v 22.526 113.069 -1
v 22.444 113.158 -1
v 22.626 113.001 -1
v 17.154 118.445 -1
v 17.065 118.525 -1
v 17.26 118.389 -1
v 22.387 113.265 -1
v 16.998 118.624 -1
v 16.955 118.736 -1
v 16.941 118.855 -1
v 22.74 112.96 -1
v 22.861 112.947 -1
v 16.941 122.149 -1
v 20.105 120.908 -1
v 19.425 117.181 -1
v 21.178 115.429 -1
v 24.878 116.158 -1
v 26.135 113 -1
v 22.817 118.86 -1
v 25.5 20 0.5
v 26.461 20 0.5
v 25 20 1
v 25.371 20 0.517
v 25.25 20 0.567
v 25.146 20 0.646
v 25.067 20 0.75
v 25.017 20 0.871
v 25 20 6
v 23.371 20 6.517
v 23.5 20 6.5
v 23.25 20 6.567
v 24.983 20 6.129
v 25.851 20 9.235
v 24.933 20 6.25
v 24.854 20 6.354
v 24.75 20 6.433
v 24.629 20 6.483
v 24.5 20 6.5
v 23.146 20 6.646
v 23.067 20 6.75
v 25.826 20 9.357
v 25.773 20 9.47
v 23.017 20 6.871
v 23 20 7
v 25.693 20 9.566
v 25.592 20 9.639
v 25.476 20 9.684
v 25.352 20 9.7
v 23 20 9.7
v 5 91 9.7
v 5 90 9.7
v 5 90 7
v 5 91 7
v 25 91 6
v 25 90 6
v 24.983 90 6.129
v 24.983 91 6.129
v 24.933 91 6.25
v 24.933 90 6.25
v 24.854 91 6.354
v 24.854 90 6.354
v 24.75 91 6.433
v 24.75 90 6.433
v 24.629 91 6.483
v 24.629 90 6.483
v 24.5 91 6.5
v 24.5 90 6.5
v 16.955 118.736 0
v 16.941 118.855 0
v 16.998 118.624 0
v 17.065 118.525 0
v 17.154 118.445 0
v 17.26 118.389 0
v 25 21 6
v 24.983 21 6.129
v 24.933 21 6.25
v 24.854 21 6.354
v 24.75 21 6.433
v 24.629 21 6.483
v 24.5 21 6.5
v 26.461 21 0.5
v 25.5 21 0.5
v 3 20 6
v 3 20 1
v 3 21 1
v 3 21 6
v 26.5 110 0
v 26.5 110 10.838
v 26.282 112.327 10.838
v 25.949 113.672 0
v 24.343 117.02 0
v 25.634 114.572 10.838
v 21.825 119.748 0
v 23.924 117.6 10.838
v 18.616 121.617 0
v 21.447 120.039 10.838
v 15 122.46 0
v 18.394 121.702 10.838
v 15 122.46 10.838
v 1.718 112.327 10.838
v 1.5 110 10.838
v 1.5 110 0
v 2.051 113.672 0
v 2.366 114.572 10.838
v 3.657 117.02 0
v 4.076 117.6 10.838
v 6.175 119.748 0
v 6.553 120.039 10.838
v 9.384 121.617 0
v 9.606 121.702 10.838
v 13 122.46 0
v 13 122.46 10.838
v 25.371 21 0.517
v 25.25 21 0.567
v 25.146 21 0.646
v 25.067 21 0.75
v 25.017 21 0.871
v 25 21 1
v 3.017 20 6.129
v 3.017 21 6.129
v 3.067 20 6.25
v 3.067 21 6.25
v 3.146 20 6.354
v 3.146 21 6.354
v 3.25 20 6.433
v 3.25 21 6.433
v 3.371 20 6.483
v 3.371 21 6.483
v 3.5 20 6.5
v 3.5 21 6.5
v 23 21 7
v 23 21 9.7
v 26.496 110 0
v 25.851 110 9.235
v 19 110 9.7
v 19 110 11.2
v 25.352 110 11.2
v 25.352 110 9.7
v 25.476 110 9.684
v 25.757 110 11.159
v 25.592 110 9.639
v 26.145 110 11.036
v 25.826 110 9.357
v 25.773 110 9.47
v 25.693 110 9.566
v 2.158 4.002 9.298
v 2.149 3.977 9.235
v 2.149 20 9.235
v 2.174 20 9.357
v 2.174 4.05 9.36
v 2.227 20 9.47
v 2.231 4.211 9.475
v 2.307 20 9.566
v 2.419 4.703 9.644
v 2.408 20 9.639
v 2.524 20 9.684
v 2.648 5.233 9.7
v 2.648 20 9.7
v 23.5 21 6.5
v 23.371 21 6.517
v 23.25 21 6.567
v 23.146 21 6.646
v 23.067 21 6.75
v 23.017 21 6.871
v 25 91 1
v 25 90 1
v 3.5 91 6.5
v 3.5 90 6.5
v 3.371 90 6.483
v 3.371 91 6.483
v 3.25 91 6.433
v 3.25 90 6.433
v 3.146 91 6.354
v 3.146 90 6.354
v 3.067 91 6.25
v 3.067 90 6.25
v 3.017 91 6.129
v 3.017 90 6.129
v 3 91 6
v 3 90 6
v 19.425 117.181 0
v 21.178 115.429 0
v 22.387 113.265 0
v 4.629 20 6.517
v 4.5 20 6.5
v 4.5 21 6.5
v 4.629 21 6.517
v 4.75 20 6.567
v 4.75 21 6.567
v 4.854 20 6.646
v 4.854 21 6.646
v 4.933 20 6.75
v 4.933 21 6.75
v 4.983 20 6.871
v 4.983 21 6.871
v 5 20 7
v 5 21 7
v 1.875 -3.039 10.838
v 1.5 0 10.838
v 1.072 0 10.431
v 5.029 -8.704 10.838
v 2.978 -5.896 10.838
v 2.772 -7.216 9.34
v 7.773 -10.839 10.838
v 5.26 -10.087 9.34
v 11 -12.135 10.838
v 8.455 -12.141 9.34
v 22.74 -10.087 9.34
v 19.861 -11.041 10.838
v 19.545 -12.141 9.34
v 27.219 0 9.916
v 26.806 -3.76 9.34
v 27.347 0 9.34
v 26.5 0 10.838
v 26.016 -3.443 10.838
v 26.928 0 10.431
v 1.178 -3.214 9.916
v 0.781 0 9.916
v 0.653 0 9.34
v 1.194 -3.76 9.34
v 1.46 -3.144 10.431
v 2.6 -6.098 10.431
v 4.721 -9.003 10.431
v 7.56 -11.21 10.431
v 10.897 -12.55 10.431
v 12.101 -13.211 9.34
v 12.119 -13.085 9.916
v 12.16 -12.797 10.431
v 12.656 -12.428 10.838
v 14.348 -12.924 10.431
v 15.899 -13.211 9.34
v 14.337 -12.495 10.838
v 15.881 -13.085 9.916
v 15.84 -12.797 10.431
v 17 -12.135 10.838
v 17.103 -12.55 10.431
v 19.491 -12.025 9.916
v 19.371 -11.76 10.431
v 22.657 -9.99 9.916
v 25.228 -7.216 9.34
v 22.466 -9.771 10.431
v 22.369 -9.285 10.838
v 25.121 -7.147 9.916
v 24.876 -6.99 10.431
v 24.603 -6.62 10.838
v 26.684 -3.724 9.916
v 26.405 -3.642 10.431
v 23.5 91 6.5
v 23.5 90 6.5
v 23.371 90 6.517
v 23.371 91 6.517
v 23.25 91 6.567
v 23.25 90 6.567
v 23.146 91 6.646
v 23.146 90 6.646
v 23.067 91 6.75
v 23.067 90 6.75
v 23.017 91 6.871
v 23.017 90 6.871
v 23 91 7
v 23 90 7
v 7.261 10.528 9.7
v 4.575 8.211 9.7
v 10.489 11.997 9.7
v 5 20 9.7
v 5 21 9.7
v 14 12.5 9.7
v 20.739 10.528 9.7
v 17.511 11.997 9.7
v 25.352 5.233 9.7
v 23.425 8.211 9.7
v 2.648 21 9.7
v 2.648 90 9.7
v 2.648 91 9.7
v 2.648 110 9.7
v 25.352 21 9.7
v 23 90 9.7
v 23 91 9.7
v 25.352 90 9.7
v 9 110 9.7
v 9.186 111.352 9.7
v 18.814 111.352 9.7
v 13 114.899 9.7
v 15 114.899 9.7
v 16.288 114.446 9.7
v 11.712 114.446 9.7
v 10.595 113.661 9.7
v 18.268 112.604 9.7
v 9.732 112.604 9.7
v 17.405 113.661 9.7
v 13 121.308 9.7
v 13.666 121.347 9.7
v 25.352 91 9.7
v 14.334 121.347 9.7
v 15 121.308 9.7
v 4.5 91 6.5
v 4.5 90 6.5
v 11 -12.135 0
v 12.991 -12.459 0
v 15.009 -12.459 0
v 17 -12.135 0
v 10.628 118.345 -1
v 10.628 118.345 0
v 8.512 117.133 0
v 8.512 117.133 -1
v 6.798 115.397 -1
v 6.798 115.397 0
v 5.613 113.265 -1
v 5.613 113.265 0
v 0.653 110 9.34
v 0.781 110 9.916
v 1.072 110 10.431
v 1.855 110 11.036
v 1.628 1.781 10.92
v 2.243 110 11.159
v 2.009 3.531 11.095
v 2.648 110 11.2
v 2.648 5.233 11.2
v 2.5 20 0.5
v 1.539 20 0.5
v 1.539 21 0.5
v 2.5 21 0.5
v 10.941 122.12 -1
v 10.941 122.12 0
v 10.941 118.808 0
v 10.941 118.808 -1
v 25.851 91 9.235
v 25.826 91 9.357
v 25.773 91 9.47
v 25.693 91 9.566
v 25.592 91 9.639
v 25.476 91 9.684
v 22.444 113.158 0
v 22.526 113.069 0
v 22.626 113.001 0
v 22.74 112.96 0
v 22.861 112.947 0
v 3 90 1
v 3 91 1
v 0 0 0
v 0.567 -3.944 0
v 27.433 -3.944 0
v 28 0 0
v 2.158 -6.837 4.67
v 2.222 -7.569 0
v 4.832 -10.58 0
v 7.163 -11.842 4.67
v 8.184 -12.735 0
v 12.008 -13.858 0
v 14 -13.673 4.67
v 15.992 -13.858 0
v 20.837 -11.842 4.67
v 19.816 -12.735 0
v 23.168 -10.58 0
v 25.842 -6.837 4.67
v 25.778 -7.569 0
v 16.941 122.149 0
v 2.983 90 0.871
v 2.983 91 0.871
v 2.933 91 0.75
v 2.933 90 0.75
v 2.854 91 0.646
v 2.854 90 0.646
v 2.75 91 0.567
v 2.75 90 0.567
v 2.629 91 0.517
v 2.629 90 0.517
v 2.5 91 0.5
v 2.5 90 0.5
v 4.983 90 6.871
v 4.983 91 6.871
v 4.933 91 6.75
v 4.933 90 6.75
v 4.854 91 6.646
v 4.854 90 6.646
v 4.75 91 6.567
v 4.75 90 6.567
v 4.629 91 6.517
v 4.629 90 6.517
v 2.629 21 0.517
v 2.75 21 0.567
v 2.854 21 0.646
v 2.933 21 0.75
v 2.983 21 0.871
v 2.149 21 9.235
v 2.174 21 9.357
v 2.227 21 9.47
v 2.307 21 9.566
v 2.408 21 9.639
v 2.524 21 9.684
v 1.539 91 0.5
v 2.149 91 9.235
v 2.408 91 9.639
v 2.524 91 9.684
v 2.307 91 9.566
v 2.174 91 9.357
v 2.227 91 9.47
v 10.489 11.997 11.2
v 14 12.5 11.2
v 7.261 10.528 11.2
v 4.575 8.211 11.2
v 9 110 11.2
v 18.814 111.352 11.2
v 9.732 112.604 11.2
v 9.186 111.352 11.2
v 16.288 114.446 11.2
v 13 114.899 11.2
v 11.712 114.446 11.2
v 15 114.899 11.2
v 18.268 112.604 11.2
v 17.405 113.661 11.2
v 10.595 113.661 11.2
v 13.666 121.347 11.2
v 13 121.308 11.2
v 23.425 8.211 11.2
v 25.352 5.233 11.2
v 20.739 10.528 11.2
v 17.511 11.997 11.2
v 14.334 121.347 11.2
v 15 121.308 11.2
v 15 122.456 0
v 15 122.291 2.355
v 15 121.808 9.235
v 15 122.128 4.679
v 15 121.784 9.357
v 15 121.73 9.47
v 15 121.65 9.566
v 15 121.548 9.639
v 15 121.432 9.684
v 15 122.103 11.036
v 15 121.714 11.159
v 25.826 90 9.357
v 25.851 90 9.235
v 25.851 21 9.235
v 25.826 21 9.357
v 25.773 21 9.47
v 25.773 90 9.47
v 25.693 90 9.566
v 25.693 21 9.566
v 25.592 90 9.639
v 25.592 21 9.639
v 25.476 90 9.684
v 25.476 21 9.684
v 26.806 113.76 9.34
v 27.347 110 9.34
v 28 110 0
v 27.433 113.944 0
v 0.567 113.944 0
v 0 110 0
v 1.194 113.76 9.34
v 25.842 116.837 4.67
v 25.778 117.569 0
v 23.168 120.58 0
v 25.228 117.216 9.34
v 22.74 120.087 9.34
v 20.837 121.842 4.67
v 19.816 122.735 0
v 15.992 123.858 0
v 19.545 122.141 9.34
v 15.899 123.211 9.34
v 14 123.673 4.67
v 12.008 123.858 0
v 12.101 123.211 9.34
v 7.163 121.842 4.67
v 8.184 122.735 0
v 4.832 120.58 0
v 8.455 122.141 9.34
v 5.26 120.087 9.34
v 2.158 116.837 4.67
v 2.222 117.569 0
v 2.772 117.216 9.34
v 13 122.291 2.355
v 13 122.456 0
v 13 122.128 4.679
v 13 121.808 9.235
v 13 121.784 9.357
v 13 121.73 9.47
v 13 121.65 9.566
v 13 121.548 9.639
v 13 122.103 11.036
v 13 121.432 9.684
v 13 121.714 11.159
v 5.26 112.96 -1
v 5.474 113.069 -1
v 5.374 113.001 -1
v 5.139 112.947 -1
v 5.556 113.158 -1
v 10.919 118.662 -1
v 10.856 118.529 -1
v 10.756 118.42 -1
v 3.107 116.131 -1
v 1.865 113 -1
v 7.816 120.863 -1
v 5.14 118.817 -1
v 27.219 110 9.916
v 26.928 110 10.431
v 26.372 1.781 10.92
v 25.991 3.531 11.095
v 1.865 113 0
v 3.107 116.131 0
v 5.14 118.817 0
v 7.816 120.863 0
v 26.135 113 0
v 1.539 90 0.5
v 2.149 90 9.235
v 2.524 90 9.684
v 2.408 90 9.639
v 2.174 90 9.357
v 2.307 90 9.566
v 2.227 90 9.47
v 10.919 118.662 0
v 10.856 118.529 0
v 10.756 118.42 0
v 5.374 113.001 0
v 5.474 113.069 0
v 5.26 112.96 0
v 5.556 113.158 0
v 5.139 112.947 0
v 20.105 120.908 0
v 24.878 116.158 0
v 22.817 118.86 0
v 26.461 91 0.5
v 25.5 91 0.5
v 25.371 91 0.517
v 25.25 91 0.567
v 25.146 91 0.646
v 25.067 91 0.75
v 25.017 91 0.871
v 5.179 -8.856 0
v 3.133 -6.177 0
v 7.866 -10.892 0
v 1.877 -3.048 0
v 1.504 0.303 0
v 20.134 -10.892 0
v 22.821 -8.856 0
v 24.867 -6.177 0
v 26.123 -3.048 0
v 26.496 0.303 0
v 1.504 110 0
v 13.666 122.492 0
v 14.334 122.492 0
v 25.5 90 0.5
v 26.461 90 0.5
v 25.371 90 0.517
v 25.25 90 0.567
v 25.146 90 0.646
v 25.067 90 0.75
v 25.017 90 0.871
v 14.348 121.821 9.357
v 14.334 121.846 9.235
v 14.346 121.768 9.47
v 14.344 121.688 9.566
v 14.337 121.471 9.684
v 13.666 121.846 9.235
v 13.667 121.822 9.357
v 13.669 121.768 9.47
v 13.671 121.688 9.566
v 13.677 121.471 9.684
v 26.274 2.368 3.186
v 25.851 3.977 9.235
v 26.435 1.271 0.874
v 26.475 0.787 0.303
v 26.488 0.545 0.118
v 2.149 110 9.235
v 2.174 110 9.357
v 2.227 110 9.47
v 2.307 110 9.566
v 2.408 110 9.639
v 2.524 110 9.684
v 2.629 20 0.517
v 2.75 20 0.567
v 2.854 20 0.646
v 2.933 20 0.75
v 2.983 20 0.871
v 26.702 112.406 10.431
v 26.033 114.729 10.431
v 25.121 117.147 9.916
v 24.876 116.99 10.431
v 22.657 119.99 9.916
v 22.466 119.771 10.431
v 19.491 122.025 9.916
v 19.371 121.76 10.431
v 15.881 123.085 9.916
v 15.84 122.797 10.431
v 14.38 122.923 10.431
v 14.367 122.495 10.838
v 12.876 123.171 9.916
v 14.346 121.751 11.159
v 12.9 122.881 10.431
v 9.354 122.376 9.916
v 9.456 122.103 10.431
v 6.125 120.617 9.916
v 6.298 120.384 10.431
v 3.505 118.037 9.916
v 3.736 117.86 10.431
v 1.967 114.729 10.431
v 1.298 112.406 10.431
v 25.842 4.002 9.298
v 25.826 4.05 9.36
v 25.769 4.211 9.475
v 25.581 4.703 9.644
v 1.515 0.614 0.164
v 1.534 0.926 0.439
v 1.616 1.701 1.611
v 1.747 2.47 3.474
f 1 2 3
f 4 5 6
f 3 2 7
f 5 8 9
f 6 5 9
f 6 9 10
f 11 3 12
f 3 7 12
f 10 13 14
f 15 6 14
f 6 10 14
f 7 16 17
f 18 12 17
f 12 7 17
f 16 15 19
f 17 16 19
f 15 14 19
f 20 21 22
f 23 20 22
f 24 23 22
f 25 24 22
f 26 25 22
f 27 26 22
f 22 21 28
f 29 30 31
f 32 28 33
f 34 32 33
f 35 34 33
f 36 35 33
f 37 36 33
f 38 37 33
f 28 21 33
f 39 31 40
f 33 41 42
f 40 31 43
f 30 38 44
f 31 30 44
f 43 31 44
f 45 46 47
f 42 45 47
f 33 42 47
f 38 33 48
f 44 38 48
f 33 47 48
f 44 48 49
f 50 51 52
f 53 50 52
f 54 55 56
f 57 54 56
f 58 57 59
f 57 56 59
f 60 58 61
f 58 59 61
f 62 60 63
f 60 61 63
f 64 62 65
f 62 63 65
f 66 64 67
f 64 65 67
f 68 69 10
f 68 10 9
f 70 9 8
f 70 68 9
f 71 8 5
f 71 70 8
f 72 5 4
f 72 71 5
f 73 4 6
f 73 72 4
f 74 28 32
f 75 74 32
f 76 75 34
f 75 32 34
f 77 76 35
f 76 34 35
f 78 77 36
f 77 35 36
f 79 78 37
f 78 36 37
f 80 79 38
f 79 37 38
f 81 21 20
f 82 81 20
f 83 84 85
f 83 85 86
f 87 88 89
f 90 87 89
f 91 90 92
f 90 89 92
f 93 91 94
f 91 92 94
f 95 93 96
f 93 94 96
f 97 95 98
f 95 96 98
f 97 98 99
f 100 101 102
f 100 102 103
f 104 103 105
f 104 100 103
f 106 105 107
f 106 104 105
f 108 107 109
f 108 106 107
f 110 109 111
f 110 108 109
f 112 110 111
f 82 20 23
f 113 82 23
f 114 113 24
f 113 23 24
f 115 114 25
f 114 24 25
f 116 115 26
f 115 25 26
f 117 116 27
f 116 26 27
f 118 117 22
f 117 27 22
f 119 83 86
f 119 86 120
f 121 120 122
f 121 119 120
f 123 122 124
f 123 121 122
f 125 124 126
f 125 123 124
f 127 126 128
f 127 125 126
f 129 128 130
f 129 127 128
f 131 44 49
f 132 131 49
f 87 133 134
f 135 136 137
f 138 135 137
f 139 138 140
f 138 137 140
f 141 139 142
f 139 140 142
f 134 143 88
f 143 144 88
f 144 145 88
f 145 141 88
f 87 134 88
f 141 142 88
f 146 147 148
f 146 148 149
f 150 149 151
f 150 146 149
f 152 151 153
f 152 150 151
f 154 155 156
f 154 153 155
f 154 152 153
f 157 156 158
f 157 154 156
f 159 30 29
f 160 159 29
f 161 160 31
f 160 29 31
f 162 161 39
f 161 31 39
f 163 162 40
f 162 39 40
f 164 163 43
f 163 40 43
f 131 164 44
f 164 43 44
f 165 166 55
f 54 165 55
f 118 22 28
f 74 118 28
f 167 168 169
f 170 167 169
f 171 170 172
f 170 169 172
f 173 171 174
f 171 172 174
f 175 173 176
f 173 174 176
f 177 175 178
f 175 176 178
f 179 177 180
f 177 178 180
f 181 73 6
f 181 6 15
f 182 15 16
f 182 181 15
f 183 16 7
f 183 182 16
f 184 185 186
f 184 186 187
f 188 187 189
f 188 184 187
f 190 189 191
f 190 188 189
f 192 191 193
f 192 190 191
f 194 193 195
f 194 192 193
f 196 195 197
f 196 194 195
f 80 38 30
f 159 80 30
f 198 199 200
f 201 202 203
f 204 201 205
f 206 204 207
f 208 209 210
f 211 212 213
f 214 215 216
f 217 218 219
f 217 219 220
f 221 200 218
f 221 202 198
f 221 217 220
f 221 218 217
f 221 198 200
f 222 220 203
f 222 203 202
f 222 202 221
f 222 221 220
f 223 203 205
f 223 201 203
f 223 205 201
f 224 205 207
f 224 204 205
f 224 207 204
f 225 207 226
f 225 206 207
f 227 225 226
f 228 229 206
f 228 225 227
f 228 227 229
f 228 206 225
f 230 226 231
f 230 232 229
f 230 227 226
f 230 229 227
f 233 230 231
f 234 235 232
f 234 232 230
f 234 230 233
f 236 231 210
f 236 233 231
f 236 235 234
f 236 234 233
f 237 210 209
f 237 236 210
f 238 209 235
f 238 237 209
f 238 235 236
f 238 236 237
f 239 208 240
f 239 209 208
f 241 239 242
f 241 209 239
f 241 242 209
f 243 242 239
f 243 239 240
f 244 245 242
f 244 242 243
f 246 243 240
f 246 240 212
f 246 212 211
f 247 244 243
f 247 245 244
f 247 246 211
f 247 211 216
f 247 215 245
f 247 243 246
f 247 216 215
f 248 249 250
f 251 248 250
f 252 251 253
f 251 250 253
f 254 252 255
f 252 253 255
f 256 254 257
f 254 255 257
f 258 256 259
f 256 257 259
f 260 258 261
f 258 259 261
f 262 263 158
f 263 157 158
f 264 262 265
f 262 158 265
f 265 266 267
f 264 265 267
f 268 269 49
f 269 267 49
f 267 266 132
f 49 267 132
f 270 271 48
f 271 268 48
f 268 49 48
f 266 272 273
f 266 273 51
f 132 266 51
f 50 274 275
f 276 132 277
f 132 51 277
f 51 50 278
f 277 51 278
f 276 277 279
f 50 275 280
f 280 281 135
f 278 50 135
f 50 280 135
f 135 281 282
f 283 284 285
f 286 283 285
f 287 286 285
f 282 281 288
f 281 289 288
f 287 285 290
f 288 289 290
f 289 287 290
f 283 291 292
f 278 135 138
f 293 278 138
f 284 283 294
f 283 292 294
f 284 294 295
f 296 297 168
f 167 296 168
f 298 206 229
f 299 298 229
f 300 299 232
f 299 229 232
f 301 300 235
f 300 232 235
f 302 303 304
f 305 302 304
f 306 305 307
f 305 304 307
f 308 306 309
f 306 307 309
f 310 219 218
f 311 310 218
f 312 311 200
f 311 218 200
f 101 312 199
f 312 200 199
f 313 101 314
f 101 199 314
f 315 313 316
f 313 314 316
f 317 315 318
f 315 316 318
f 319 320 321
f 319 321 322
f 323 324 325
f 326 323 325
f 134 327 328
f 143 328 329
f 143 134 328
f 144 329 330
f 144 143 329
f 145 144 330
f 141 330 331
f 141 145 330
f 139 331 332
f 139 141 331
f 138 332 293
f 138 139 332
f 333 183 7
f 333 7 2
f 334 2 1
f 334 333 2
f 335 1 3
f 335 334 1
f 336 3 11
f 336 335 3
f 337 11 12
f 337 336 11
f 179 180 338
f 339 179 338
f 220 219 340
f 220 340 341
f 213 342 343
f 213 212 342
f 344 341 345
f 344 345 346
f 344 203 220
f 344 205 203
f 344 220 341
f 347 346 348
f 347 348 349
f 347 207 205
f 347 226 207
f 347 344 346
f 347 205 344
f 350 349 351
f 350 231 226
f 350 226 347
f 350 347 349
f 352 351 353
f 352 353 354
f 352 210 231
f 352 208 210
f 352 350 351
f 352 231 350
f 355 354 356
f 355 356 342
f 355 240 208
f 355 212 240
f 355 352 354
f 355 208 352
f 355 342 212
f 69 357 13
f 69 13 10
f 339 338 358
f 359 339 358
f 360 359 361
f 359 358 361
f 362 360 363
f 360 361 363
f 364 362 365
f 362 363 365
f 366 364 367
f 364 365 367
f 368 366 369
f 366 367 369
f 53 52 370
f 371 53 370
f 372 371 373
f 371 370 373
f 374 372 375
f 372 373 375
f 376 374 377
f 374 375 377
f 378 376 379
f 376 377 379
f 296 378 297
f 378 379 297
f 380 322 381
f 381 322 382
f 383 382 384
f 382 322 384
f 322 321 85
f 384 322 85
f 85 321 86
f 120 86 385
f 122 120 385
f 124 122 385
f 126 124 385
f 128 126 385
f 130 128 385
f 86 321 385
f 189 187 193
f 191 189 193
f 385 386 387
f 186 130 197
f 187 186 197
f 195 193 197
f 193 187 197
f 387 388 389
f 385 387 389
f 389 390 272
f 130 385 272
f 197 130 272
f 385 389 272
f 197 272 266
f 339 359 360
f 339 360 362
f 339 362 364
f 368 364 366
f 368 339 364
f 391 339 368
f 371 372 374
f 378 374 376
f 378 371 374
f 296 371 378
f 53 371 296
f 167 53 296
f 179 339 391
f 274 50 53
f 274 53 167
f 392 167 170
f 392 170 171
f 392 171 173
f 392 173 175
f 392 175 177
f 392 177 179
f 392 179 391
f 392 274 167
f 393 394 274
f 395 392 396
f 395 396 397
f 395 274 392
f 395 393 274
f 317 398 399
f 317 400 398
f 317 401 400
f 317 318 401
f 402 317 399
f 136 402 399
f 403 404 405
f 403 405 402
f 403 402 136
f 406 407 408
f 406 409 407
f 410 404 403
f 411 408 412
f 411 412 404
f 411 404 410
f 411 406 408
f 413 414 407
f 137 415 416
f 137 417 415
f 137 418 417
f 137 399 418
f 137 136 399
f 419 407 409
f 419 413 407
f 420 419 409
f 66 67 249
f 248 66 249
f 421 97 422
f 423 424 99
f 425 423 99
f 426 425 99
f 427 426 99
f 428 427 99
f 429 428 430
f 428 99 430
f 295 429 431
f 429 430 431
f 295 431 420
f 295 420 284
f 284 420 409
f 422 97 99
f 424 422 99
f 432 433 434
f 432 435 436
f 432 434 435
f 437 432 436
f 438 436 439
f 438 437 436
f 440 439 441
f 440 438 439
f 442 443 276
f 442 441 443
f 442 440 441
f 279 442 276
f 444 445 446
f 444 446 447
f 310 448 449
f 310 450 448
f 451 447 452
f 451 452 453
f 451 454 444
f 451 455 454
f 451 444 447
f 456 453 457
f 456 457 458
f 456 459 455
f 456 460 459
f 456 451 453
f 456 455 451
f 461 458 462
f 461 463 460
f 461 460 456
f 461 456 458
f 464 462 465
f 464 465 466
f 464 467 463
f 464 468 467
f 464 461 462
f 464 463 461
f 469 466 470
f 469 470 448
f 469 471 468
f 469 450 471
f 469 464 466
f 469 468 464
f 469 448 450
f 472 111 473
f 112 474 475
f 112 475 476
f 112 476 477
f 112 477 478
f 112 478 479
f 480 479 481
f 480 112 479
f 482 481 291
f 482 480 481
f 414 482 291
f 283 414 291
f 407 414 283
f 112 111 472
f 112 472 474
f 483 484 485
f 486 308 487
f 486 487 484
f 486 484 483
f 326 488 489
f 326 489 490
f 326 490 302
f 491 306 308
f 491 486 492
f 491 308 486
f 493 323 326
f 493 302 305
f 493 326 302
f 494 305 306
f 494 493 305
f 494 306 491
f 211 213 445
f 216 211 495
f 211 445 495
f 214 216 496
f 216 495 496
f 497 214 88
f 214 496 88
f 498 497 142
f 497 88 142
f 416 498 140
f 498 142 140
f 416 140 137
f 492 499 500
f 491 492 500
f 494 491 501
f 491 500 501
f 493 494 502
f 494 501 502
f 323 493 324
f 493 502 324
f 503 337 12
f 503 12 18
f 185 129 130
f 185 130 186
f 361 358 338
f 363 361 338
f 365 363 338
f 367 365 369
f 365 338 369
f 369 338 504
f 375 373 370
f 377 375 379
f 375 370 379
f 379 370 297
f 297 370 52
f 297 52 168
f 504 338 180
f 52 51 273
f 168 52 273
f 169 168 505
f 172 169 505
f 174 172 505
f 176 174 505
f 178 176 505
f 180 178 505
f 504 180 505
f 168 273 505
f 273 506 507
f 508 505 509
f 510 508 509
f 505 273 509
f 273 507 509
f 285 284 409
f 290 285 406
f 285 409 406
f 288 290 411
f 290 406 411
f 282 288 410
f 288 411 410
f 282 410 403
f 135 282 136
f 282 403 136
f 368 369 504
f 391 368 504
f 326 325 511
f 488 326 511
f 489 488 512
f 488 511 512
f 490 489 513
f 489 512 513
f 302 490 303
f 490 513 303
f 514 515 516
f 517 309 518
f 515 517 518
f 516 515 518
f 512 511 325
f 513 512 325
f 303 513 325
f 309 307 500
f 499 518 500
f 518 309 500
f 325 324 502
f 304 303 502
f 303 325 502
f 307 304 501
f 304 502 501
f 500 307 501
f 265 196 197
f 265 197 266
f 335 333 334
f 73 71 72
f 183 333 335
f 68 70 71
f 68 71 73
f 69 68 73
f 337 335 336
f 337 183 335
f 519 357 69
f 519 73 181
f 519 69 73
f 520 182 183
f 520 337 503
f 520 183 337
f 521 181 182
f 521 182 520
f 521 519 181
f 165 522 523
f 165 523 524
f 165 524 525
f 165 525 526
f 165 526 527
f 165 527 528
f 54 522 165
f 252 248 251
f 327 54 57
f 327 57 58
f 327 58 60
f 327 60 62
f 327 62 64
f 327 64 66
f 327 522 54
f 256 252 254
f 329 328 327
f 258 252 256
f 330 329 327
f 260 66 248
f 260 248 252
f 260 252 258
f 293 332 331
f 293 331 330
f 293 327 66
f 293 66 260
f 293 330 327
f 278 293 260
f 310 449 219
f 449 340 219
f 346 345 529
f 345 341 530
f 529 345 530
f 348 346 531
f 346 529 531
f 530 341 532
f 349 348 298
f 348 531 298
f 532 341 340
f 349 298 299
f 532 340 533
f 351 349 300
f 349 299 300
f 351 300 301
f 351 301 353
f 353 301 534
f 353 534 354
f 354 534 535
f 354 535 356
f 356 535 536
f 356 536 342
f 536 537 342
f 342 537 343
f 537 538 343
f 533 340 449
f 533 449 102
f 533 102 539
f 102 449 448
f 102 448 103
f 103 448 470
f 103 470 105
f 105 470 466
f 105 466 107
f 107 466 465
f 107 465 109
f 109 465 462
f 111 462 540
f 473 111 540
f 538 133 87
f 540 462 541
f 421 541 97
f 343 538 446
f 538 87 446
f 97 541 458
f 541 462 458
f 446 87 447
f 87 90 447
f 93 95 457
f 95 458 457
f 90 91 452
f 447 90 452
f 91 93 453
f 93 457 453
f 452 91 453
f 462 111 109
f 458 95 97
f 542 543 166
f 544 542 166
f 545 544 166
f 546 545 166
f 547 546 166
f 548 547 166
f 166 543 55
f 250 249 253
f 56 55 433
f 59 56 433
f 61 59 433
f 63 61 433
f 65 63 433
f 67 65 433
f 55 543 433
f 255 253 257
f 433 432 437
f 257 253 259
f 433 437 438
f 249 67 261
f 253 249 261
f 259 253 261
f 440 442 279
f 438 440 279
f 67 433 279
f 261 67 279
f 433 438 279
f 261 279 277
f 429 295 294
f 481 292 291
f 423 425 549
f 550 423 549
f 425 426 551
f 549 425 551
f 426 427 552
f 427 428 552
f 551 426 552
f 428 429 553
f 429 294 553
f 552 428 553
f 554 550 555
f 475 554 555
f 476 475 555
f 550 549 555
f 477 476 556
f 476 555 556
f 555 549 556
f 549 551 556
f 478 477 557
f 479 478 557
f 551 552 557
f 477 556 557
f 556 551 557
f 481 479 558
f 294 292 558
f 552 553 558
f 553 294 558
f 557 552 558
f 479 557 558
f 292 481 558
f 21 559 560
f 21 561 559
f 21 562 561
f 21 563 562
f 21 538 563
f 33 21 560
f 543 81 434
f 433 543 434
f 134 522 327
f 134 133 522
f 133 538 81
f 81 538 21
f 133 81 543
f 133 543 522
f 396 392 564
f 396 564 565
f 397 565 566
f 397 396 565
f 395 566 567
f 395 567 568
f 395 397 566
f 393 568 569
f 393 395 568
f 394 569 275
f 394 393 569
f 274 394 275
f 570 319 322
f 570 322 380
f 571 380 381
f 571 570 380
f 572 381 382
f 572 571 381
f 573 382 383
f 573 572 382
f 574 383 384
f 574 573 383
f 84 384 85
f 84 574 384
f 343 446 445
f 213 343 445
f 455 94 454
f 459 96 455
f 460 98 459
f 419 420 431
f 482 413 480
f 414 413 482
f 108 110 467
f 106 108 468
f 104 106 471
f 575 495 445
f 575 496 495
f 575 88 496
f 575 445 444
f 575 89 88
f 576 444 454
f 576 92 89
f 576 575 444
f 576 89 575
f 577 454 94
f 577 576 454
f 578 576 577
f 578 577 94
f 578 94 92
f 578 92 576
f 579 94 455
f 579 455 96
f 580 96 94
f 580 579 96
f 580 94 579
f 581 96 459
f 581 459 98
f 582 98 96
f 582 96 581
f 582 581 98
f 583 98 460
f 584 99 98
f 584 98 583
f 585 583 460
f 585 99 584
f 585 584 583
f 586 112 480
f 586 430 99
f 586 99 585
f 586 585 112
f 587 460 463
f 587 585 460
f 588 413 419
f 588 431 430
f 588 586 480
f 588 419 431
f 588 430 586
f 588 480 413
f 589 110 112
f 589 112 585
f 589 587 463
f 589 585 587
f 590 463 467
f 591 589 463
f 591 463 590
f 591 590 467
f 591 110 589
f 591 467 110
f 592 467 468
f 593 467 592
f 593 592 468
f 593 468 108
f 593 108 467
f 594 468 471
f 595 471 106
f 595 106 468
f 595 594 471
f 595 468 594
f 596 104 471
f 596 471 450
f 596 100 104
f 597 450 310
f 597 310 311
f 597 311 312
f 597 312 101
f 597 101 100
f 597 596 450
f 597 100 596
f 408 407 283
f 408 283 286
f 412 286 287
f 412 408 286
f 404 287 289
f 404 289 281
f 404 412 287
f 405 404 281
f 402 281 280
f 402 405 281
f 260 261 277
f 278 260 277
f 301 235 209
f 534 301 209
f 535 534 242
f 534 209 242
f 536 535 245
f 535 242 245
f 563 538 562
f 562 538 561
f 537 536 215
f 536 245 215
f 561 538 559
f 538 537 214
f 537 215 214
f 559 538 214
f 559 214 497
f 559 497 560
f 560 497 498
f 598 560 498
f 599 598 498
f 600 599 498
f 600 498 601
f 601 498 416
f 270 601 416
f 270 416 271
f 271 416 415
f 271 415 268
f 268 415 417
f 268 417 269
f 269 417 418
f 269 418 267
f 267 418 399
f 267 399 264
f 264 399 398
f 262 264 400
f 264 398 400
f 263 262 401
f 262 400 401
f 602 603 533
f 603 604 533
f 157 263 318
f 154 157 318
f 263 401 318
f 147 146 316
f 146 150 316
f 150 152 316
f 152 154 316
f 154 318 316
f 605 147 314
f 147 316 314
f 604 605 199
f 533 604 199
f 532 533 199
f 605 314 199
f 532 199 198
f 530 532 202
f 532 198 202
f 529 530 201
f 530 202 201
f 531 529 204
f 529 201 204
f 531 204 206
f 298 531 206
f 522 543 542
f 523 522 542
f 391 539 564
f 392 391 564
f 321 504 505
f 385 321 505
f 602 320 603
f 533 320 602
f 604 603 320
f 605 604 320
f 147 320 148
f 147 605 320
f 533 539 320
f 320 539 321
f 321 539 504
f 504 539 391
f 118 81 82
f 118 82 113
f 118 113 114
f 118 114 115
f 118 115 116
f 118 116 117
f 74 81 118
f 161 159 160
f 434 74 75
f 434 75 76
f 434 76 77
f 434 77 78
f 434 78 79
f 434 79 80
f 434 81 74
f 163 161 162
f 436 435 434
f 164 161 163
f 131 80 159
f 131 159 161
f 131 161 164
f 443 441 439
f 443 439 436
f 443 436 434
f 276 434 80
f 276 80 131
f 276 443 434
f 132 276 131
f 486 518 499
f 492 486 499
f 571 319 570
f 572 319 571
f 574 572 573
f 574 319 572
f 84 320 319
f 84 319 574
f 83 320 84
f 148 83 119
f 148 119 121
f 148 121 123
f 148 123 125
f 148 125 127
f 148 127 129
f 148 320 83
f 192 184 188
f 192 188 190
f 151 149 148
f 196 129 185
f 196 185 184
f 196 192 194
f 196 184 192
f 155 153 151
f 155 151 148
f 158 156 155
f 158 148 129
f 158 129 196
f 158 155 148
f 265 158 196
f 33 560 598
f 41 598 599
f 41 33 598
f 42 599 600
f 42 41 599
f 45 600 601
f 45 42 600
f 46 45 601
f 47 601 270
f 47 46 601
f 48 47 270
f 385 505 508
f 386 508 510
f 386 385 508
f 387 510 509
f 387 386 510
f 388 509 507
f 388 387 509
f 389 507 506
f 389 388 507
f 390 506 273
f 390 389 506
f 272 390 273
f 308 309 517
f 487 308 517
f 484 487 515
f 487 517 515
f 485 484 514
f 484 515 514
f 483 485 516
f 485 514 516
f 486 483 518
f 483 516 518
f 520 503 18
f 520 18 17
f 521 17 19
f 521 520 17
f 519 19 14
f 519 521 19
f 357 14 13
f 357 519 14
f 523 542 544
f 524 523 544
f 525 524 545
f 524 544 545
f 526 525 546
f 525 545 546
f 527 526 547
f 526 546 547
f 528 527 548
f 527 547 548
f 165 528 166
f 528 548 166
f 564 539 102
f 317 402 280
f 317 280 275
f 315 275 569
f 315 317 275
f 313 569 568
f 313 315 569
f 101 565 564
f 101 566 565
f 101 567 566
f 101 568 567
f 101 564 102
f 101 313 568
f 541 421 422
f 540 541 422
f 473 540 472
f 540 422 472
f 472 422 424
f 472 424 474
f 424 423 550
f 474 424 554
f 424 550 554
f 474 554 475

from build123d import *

# Parameters (mm, degrees)
EXTRUSION1_DEPTH        = 11.2
EXTRUSION1_TAPER        = 4
CONG_1_R                = 2
COQUE1_T                = -1.5
ENL_V_MAT_EXTRU_1_DEPTH = 128.614419248
EXTRUSION2_DEPTH        = 1
EXTRUSION3_DEPTH        = 1
EXTRUSION4_DEPTH        = 1
EXTRUSION4_2_DEPTH      = 1


with BuildPart() as part:
    # Esquisse1 → Extrusion1 (new body)
    with BuildSketch(Plane.XY):
        with BuildLine():
            ThreePointArc((0, 0), (14, -14), (28, 0))
            Line((28, 0), (28, 110))
            ThreePointArc((28, 110), (14, 124), (0, 110))
            Line((0, 110), (0, 0))
        make_face()
    extrude(amount=EXTRUSION1_DEPTH, taper=EXTRUSION1_TAPER)

    # Congé1
    cong_1_edges = [part.edges().sort_by_distance(p)[0] for p in [
        (14, 123.216819706, 11.2),
        (0.783180294, 55, 11.2),
        (14, -13.216819706, 11.2),
        (27.216819706, 55, 11.2),
    ]]
    fillet(cong_1_edges, radius=CONG_1_R)

    # Coque1
    coque1_openings = [part.faces().sort_by_distance(p)[0] for p in [
        (14, 55, 0),
    ]]
    offset(amount=COQUE1_T, openings=coque1_openings, kind=Kind.INTERSECTION)

    # Esquisse2 → Enlèv. mat.-Extru.1 (cut, through all)
    with BuildSketch(Plane.XY.offset(11.2)):
        with BuildLine():
            Line((13, 122.459935794), (13, 114.898979486))
            ThreePointArc((13, 114.898979486), (10.127016654, 113.16227766), (9, 110))
            Line((9, 110), (1.5, 110))
            ThreePointArc((1.5, 110), (4.814413465, 118.477912479), (13, 122.459935794))
        make_face()
        with BuildLine():
            Line((15, 122.459935794), (15, 114.898979486))
            ThreePointArc((15, 114.898979486), (17.872983346, 113.16227766), (19, 110))
            Line((19, 110), (26.5, 110))
            ThreePointArc((26.5, 110), (23.185586535, 118.477912479), (15, 122.459935794))
        make_face()
        with BuildLine():
            ThreePointArc((17, -12.1346611), (14, 12.5), (11, -12.1346611))
            ThreePointArc((11, -12.1346611), (14, -12.5), (17, -12.1346611))
        make_face()
    extrude(amount=-ENL_V_MAT_EXTRU_1_DEPTH, mode=Mode.SUBTRACT)

    # Esquisse4 → Extrusion2 (add)
    with BuildSketch(Plane(origin=(0, 20, 0), x_dir=(-1, 0, 0), z_dir=(0, 1, 0))):
        with BuildLine():
            Line((-23, 9.7), (-25.351789534, 9.7))
            ThreePointArc((-25.351789534, 9.7), (-25.692788714, 9.565676851), (-25.850571559, 9.234878237))
            Line((-25.850571559, 9.234878237), (-26.461373747, 0.5))
            Line((-26.461373747, 0.5), (-25.5, 0.5))
            ThreePointArc((-25.5, 0.5), (-25.146446609, 0.646446609), (-25, 1))
            Line((-25, 1), (-25, 6))
            ThreePointArc((-25, 6), (-24.853553391, 6.353553391), (-24.5, 6.5))
            Line((-24.5, 6.5), (-23.5, 6.5))
            ThreePointArc((-23.5, 6.5), (-23.146446609, 6.646446609), (-23, 7))
            Line((-23, 7), (-23, 9.7))
        make_face()
        with BuildLine():
            Line((-2.149428441, 9.234878237), (-1.538626253, 0.5))
            Line((-1.538626253, 0.5), (-2.5, 0.5))
            ThreePointArc((-2.5, 0.5), (-2.853553391, 0.646446609), (-3, 1))
            Line((-3, 1), (-3, 6))
            ThreePointArc((-3, 6), (-3.146446609, 6.353553391), (-3.5, 6.5))
            Line((-3.5, 6.5), (-4.5, 6.5))
            ThreePointArc((-4.5, 6.5), (-4.853553391, 6.646446609), (-5, 7))
            Line((-5, 7), (-5, 9.7))
            Line((-5, 9.7), (-2.648210466, 9.7))
            ThreePointArc((-2.648210466, 9.7), (-2.307211286, 9.565676851), (-2.149428441, 9.234878237))
        make_face()
    extrude(amount=EXTRUSION2_DEPTH)

    # Esquisse5 → Extrusion3 (add)
    with BuildSketch(Plane(origin=(0, 90, 0), x_dir=(-1, 0, 0), z_dir=(0, 1, 0))):
        with BuildLine():
            Line((-25.850571559, 9.234878237), (-26.461373747, 0.5))
            Line((-26.461373747, 0.5), (-25.5, 0.5))
            ThreePointArc((-25.5, 0.5), (-25.146446609, 0.646446609), (-25, 1))
            Line((-25, 1), (-25, 6))
            ThreePointArc((-25, 6), (-24.853553391, 6.353553391), (-24.5, 6.5))
            Line((-24.5, 6.5), (-23.5, 6.5))
            ThreePointArc((-23.5, 6.5), (-23.146446609, 6.646446609), (-23, 7))
            Line((-23, 7), (-23, 9.7))
            Line((-23, 9.7), (-25.351789534, 9.7))
            ThreePointArc((-25.351789534, 9.7), (-25.692788714, 9.565676851), (-25.850571559, 9.234878237))
        make_face()
        with BuildLine():
            Line((-2.648210466, 9.7), (-5, 9.7))
            Line((-5, 9.7), (-5, 7))
            ThreePointArc((-5, 7), (-4.853553391, 6.646446609), (-4.5, 6.5))
            Line((-4.5, 6.5), (-3.5, 6.5))
            ThreePointArc((-3.5, 6.5), (-3.146446609, 6.353553391), (-3, 6))
            Line((-3, 6), (-3, 1))
            ThreePointArc((-3, 1), (-2.853553391, 0.646446609), (-2.5, 0.5))
            Line((-2.5, 0.5), (-1.538626253, 0.5))
            Line((-1.538626253, 0.5), (-2.149428441, 9.234878237))
            ThreePointArc((-2.149428441, 9.234878237), (-2.307211286, 9.565676851), (-2.648210466, 9.7))
        make_face()
    extrude(amount=EXTRUSION3_DEPTH)


with BuildPart() as body_2:
    # Esquisse6 → Extrusion4 (new body)
    with BuildSketch(Plane(origin=(0, 0, 0), x_dir=(-1, 0, 0), z_dir=(0, 0, -1))):
        with BuildLine():
            Line((-16.94102449, 122.14908947), (-16.94102449, 118.854905446))
            ThreePointArc((-16.94102449, 118.854905446), (-17.028378591, 118.572552189), (-17.259917938, 118.388857791))
            ThreePointArc((-17.259917938, 118.388857791), (-20.361911425, 116.366009977), (-22.386756582, 113.265319899))
            ThreePointArc((-22.386756582, 113.265319899), (-22.573830073, 113.031710254), (-22.860812557, 112.946792581))
            Line((-22.860812557, 112.946792581), (-26.1346611, 113))
            ThreePointArc((-26.1346611, 113), (-22.81734277, 118.860274627), (-16.94102449, 122.14908947))
        make_face()
    extrude(amount=EXTRUSION4_DEPTH)


with BuildPart() as body_3:
    # Esquisse6 → Extrusion4 2 (new body)
    with BuildSketch(Plane(origin=(0, 0, 0), x_dir=(-1, 0, 0), z_dir=(0, 0, -1))):
        with BuildLine():
            Line((-10.94102449, 122.119928582), (-10.94102449, 118.808160609))
            ThreePointArc((-10.94102449, 118.808160609), (-10.855546655, 118.528569167), (-10.628338991, 118.344573209))
            ThreePointArc((-10.628338991, 118.344573209), (-7.595720212, 116.3233852), (-5.613243418, 113.265319899))
            ThreePointArc((-5.613243418, 113.265319899), (-5.426169927, 113.031710254), (-5.139187443, 112.946792581))
            Line((-5.139187443, 112.946792581), (-1.8653389, 113))
            ThreePointArc((-1.8653389, 113), (-5.139699628, 118.8173169), (-10.94102449, 122.119928582))
        make_face()
    extrude(amount=EXTRUSION4_2_DEPTH)


solid = Compound([part.part, body_2.part, body_3.part])
